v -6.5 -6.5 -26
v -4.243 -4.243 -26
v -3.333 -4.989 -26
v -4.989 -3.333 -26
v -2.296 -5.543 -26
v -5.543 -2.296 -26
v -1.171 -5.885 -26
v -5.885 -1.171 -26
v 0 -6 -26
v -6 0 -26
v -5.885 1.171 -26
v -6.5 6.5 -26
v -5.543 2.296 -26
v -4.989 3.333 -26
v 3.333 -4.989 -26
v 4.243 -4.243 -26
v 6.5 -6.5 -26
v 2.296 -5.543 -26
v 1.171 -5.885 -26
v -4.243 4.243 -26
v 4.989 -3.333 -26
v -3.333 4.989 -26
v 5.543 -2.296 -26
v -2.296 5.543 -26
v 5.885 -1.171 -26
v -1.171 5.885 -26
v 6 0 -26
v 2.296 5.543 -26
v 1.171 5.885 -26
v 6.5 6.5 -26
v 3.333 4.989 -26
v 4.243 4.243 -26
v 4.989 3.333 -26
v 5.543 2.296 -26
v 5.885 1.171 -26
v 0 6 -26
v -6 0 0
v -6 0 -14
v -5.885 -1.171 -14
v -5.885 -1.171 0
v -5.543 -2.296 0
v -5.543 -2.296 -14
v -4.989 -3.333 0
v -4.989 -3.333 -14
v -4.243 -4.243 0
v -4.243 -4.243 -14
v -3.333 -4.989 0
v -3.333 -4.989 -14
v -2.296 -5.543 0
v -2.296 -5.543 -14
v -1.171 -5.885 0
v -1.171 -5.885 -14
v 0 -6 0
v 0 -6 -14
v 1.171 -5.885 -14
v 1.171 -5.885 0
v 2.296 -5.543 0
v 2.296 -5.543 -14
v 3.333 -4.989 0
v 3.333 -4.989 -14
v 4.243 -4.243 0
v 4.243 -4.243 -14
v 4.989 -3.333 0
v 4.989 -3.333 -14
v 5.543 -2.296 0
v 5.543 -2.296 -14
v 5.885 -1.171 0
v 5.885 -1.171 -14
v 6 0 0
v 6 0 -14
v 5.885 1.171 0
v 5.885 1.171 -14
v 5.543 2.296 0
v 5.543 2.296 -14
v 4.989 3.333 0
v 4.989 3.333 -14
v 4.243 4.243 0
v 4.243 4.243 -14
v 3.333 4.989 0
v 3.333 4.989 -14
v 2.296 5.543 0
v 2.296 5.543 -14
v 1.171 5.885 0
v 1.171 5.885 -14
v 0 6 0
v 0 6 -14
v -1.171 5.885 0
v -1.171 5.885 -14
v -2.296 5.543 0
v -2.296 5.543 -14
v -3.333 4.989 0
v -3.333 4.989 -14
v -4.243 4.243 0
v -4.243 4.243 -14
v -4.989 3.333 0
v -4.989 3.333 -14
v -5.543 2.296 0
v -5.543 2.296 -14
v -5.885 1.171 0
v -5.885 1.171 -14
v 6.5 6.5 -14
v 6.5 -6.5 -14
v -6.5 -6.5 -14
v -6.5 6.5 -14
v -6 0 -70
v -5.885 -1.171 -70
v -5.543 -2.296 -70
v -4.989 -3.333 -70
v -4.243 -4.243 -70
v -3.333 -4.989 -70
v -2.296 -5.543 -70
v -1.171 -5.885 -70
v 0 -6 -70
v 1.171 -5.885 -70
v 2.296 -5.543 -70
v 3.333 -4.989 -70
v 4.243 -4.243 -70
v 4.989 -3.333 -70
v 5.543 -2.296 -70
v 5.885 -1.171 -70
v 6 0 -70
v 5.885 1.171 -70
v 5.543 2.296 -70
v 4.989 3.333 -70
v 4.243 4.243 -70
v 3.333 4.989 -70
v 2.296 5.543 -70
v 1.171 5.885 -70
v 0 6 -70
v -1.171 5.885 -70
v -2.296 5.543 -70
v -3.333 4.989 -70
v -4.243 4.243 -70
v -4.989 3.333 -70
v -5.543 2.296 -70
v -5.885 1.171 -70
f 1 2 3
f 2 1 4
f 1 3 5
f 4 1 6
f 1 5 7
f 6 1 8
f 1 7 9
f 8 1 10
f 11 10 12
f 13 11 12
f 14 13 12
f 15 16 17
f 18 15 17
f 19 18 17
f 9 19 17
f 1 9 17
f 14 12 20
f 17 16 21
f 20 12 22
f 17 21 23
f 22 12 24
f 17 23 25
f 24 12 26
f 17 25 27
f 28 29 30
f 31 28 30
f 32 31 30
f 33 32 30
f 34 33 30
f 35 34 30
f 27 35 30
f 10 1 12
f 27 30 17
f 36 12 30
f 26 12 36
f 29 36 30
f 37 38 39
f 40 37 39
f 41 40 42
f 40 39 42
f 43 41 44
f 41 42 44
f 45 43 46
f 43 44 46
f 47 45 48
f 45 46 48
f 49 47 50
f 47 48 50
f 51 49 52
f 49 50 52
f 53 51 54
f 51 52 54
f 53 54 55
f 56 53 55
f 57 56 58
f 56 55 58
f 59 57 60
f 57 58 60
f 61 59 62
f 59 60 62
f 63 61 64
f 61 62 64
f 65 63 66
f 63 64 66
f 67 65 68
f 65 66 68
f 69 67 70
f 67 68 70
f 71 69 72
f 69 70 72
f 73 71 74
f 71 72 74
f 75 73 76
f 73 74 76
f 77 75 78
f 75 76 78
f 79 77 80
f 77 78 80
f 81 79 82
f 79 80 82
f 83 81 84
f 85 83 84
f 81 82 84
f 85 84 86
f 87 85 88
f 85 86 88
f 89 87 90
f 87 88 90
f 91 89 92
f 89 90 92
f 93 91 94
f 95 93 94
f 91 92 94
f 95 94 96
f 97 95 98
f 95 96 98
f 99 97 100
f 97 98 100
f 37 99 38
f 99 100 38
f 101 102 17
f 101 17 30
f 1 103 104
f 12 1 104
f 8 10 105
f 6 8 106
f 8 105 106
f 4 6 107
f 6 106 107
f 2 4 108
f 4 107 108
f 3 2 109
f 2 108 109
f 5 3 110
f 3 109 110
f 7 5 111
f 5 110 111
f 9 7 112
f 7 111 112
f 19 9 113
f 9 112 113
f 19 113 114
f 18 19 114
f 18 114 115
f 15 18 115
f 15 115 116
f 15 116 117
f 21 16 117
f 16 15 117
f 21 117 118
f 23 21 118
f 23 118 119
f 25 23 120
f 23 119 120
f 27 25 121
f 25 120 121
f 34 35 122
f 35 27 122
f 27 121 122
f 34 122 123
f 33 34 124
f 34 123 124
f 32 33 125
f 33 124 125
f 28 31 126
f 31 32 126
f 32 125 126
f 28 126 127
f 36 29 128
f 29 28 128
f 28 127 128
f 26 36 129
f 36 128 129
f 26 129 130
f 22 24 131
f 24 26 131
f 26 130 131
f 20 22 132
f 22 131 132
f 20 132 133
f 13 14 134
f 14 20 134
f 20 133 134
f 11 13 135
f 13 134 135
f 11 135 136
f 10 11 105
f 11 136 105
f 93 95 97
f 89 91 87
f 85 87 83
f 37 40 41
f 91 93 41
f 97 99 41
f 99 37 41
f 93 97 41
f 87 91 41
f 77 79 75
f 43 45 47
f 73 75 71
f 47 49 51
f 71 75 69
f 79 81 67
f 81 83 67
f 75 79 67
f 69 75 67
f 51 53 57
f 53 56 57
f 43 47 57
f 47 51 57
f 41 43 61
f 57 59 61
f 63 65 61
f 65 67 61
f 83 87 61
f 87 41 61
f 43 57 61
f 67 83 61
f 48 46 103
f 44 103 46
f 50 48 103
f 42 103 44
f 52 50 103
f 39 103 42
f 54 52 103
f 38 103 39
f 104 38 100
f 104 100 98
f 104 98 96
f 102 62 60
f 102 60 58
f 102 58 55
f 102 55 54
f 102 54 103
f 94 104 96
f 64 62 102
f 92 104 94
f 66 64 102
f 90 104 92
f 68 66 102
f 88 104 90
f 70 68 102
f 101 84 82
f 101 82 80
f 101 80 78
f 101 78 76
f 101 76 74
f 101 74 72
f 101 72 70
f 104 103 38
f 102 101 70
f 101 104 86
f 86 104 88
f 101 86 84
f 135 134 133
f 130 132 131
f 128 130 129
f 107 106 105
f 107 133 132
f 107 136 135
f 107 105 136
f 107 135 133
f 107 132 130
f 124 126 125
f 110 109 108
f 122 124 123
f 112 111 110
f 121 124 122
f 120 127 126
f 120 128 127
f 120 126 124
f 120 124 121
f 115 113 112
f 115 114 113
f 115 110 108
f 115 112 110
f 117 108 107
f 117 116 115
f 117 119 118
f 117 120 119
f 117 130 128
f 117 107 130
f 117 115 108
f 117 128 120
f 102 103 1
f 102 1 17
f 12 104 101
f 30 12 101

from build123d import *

# Parameters (mm, degrees)
SKETCH1_W           = 6
SKETCH1_H           = 70
SKETCH2_W           = 13
SKETCH2_H           = 13
BOSS_EXTRUDE1_DEPTH = 12


with BuildPart() as part:
    # Sketch1 → Revolve1 (revolve)
    with BuildSketch(Plane(origin=(0, 0, 0), x_dir=(1, 0, 0), z_dir=(0, 1, 0)), mode=Mode.PRIVATE) as revolve1_sk:
        with Locations((3, 35)):
            Rectangle(SKETCH1_W, SKETCH1_H)
    revolve(revolve1_sk.sketch.rotate(Axis((0, 0, -75.213634587), (0, 0, 1)), 180), axis=Axis((0, 0, -75.213634587), (0, 0, 1)))

    # Sketch2 → Boss-Extrude1 (add)
    with BuildSketch(Plane.XY.offset(-14)):
        Rectangle(SKETCH2_W, SKETCH2_H)
    extrude(amount=-BOSS_EXTRUDE1_DEPTH)


solid = part.part
